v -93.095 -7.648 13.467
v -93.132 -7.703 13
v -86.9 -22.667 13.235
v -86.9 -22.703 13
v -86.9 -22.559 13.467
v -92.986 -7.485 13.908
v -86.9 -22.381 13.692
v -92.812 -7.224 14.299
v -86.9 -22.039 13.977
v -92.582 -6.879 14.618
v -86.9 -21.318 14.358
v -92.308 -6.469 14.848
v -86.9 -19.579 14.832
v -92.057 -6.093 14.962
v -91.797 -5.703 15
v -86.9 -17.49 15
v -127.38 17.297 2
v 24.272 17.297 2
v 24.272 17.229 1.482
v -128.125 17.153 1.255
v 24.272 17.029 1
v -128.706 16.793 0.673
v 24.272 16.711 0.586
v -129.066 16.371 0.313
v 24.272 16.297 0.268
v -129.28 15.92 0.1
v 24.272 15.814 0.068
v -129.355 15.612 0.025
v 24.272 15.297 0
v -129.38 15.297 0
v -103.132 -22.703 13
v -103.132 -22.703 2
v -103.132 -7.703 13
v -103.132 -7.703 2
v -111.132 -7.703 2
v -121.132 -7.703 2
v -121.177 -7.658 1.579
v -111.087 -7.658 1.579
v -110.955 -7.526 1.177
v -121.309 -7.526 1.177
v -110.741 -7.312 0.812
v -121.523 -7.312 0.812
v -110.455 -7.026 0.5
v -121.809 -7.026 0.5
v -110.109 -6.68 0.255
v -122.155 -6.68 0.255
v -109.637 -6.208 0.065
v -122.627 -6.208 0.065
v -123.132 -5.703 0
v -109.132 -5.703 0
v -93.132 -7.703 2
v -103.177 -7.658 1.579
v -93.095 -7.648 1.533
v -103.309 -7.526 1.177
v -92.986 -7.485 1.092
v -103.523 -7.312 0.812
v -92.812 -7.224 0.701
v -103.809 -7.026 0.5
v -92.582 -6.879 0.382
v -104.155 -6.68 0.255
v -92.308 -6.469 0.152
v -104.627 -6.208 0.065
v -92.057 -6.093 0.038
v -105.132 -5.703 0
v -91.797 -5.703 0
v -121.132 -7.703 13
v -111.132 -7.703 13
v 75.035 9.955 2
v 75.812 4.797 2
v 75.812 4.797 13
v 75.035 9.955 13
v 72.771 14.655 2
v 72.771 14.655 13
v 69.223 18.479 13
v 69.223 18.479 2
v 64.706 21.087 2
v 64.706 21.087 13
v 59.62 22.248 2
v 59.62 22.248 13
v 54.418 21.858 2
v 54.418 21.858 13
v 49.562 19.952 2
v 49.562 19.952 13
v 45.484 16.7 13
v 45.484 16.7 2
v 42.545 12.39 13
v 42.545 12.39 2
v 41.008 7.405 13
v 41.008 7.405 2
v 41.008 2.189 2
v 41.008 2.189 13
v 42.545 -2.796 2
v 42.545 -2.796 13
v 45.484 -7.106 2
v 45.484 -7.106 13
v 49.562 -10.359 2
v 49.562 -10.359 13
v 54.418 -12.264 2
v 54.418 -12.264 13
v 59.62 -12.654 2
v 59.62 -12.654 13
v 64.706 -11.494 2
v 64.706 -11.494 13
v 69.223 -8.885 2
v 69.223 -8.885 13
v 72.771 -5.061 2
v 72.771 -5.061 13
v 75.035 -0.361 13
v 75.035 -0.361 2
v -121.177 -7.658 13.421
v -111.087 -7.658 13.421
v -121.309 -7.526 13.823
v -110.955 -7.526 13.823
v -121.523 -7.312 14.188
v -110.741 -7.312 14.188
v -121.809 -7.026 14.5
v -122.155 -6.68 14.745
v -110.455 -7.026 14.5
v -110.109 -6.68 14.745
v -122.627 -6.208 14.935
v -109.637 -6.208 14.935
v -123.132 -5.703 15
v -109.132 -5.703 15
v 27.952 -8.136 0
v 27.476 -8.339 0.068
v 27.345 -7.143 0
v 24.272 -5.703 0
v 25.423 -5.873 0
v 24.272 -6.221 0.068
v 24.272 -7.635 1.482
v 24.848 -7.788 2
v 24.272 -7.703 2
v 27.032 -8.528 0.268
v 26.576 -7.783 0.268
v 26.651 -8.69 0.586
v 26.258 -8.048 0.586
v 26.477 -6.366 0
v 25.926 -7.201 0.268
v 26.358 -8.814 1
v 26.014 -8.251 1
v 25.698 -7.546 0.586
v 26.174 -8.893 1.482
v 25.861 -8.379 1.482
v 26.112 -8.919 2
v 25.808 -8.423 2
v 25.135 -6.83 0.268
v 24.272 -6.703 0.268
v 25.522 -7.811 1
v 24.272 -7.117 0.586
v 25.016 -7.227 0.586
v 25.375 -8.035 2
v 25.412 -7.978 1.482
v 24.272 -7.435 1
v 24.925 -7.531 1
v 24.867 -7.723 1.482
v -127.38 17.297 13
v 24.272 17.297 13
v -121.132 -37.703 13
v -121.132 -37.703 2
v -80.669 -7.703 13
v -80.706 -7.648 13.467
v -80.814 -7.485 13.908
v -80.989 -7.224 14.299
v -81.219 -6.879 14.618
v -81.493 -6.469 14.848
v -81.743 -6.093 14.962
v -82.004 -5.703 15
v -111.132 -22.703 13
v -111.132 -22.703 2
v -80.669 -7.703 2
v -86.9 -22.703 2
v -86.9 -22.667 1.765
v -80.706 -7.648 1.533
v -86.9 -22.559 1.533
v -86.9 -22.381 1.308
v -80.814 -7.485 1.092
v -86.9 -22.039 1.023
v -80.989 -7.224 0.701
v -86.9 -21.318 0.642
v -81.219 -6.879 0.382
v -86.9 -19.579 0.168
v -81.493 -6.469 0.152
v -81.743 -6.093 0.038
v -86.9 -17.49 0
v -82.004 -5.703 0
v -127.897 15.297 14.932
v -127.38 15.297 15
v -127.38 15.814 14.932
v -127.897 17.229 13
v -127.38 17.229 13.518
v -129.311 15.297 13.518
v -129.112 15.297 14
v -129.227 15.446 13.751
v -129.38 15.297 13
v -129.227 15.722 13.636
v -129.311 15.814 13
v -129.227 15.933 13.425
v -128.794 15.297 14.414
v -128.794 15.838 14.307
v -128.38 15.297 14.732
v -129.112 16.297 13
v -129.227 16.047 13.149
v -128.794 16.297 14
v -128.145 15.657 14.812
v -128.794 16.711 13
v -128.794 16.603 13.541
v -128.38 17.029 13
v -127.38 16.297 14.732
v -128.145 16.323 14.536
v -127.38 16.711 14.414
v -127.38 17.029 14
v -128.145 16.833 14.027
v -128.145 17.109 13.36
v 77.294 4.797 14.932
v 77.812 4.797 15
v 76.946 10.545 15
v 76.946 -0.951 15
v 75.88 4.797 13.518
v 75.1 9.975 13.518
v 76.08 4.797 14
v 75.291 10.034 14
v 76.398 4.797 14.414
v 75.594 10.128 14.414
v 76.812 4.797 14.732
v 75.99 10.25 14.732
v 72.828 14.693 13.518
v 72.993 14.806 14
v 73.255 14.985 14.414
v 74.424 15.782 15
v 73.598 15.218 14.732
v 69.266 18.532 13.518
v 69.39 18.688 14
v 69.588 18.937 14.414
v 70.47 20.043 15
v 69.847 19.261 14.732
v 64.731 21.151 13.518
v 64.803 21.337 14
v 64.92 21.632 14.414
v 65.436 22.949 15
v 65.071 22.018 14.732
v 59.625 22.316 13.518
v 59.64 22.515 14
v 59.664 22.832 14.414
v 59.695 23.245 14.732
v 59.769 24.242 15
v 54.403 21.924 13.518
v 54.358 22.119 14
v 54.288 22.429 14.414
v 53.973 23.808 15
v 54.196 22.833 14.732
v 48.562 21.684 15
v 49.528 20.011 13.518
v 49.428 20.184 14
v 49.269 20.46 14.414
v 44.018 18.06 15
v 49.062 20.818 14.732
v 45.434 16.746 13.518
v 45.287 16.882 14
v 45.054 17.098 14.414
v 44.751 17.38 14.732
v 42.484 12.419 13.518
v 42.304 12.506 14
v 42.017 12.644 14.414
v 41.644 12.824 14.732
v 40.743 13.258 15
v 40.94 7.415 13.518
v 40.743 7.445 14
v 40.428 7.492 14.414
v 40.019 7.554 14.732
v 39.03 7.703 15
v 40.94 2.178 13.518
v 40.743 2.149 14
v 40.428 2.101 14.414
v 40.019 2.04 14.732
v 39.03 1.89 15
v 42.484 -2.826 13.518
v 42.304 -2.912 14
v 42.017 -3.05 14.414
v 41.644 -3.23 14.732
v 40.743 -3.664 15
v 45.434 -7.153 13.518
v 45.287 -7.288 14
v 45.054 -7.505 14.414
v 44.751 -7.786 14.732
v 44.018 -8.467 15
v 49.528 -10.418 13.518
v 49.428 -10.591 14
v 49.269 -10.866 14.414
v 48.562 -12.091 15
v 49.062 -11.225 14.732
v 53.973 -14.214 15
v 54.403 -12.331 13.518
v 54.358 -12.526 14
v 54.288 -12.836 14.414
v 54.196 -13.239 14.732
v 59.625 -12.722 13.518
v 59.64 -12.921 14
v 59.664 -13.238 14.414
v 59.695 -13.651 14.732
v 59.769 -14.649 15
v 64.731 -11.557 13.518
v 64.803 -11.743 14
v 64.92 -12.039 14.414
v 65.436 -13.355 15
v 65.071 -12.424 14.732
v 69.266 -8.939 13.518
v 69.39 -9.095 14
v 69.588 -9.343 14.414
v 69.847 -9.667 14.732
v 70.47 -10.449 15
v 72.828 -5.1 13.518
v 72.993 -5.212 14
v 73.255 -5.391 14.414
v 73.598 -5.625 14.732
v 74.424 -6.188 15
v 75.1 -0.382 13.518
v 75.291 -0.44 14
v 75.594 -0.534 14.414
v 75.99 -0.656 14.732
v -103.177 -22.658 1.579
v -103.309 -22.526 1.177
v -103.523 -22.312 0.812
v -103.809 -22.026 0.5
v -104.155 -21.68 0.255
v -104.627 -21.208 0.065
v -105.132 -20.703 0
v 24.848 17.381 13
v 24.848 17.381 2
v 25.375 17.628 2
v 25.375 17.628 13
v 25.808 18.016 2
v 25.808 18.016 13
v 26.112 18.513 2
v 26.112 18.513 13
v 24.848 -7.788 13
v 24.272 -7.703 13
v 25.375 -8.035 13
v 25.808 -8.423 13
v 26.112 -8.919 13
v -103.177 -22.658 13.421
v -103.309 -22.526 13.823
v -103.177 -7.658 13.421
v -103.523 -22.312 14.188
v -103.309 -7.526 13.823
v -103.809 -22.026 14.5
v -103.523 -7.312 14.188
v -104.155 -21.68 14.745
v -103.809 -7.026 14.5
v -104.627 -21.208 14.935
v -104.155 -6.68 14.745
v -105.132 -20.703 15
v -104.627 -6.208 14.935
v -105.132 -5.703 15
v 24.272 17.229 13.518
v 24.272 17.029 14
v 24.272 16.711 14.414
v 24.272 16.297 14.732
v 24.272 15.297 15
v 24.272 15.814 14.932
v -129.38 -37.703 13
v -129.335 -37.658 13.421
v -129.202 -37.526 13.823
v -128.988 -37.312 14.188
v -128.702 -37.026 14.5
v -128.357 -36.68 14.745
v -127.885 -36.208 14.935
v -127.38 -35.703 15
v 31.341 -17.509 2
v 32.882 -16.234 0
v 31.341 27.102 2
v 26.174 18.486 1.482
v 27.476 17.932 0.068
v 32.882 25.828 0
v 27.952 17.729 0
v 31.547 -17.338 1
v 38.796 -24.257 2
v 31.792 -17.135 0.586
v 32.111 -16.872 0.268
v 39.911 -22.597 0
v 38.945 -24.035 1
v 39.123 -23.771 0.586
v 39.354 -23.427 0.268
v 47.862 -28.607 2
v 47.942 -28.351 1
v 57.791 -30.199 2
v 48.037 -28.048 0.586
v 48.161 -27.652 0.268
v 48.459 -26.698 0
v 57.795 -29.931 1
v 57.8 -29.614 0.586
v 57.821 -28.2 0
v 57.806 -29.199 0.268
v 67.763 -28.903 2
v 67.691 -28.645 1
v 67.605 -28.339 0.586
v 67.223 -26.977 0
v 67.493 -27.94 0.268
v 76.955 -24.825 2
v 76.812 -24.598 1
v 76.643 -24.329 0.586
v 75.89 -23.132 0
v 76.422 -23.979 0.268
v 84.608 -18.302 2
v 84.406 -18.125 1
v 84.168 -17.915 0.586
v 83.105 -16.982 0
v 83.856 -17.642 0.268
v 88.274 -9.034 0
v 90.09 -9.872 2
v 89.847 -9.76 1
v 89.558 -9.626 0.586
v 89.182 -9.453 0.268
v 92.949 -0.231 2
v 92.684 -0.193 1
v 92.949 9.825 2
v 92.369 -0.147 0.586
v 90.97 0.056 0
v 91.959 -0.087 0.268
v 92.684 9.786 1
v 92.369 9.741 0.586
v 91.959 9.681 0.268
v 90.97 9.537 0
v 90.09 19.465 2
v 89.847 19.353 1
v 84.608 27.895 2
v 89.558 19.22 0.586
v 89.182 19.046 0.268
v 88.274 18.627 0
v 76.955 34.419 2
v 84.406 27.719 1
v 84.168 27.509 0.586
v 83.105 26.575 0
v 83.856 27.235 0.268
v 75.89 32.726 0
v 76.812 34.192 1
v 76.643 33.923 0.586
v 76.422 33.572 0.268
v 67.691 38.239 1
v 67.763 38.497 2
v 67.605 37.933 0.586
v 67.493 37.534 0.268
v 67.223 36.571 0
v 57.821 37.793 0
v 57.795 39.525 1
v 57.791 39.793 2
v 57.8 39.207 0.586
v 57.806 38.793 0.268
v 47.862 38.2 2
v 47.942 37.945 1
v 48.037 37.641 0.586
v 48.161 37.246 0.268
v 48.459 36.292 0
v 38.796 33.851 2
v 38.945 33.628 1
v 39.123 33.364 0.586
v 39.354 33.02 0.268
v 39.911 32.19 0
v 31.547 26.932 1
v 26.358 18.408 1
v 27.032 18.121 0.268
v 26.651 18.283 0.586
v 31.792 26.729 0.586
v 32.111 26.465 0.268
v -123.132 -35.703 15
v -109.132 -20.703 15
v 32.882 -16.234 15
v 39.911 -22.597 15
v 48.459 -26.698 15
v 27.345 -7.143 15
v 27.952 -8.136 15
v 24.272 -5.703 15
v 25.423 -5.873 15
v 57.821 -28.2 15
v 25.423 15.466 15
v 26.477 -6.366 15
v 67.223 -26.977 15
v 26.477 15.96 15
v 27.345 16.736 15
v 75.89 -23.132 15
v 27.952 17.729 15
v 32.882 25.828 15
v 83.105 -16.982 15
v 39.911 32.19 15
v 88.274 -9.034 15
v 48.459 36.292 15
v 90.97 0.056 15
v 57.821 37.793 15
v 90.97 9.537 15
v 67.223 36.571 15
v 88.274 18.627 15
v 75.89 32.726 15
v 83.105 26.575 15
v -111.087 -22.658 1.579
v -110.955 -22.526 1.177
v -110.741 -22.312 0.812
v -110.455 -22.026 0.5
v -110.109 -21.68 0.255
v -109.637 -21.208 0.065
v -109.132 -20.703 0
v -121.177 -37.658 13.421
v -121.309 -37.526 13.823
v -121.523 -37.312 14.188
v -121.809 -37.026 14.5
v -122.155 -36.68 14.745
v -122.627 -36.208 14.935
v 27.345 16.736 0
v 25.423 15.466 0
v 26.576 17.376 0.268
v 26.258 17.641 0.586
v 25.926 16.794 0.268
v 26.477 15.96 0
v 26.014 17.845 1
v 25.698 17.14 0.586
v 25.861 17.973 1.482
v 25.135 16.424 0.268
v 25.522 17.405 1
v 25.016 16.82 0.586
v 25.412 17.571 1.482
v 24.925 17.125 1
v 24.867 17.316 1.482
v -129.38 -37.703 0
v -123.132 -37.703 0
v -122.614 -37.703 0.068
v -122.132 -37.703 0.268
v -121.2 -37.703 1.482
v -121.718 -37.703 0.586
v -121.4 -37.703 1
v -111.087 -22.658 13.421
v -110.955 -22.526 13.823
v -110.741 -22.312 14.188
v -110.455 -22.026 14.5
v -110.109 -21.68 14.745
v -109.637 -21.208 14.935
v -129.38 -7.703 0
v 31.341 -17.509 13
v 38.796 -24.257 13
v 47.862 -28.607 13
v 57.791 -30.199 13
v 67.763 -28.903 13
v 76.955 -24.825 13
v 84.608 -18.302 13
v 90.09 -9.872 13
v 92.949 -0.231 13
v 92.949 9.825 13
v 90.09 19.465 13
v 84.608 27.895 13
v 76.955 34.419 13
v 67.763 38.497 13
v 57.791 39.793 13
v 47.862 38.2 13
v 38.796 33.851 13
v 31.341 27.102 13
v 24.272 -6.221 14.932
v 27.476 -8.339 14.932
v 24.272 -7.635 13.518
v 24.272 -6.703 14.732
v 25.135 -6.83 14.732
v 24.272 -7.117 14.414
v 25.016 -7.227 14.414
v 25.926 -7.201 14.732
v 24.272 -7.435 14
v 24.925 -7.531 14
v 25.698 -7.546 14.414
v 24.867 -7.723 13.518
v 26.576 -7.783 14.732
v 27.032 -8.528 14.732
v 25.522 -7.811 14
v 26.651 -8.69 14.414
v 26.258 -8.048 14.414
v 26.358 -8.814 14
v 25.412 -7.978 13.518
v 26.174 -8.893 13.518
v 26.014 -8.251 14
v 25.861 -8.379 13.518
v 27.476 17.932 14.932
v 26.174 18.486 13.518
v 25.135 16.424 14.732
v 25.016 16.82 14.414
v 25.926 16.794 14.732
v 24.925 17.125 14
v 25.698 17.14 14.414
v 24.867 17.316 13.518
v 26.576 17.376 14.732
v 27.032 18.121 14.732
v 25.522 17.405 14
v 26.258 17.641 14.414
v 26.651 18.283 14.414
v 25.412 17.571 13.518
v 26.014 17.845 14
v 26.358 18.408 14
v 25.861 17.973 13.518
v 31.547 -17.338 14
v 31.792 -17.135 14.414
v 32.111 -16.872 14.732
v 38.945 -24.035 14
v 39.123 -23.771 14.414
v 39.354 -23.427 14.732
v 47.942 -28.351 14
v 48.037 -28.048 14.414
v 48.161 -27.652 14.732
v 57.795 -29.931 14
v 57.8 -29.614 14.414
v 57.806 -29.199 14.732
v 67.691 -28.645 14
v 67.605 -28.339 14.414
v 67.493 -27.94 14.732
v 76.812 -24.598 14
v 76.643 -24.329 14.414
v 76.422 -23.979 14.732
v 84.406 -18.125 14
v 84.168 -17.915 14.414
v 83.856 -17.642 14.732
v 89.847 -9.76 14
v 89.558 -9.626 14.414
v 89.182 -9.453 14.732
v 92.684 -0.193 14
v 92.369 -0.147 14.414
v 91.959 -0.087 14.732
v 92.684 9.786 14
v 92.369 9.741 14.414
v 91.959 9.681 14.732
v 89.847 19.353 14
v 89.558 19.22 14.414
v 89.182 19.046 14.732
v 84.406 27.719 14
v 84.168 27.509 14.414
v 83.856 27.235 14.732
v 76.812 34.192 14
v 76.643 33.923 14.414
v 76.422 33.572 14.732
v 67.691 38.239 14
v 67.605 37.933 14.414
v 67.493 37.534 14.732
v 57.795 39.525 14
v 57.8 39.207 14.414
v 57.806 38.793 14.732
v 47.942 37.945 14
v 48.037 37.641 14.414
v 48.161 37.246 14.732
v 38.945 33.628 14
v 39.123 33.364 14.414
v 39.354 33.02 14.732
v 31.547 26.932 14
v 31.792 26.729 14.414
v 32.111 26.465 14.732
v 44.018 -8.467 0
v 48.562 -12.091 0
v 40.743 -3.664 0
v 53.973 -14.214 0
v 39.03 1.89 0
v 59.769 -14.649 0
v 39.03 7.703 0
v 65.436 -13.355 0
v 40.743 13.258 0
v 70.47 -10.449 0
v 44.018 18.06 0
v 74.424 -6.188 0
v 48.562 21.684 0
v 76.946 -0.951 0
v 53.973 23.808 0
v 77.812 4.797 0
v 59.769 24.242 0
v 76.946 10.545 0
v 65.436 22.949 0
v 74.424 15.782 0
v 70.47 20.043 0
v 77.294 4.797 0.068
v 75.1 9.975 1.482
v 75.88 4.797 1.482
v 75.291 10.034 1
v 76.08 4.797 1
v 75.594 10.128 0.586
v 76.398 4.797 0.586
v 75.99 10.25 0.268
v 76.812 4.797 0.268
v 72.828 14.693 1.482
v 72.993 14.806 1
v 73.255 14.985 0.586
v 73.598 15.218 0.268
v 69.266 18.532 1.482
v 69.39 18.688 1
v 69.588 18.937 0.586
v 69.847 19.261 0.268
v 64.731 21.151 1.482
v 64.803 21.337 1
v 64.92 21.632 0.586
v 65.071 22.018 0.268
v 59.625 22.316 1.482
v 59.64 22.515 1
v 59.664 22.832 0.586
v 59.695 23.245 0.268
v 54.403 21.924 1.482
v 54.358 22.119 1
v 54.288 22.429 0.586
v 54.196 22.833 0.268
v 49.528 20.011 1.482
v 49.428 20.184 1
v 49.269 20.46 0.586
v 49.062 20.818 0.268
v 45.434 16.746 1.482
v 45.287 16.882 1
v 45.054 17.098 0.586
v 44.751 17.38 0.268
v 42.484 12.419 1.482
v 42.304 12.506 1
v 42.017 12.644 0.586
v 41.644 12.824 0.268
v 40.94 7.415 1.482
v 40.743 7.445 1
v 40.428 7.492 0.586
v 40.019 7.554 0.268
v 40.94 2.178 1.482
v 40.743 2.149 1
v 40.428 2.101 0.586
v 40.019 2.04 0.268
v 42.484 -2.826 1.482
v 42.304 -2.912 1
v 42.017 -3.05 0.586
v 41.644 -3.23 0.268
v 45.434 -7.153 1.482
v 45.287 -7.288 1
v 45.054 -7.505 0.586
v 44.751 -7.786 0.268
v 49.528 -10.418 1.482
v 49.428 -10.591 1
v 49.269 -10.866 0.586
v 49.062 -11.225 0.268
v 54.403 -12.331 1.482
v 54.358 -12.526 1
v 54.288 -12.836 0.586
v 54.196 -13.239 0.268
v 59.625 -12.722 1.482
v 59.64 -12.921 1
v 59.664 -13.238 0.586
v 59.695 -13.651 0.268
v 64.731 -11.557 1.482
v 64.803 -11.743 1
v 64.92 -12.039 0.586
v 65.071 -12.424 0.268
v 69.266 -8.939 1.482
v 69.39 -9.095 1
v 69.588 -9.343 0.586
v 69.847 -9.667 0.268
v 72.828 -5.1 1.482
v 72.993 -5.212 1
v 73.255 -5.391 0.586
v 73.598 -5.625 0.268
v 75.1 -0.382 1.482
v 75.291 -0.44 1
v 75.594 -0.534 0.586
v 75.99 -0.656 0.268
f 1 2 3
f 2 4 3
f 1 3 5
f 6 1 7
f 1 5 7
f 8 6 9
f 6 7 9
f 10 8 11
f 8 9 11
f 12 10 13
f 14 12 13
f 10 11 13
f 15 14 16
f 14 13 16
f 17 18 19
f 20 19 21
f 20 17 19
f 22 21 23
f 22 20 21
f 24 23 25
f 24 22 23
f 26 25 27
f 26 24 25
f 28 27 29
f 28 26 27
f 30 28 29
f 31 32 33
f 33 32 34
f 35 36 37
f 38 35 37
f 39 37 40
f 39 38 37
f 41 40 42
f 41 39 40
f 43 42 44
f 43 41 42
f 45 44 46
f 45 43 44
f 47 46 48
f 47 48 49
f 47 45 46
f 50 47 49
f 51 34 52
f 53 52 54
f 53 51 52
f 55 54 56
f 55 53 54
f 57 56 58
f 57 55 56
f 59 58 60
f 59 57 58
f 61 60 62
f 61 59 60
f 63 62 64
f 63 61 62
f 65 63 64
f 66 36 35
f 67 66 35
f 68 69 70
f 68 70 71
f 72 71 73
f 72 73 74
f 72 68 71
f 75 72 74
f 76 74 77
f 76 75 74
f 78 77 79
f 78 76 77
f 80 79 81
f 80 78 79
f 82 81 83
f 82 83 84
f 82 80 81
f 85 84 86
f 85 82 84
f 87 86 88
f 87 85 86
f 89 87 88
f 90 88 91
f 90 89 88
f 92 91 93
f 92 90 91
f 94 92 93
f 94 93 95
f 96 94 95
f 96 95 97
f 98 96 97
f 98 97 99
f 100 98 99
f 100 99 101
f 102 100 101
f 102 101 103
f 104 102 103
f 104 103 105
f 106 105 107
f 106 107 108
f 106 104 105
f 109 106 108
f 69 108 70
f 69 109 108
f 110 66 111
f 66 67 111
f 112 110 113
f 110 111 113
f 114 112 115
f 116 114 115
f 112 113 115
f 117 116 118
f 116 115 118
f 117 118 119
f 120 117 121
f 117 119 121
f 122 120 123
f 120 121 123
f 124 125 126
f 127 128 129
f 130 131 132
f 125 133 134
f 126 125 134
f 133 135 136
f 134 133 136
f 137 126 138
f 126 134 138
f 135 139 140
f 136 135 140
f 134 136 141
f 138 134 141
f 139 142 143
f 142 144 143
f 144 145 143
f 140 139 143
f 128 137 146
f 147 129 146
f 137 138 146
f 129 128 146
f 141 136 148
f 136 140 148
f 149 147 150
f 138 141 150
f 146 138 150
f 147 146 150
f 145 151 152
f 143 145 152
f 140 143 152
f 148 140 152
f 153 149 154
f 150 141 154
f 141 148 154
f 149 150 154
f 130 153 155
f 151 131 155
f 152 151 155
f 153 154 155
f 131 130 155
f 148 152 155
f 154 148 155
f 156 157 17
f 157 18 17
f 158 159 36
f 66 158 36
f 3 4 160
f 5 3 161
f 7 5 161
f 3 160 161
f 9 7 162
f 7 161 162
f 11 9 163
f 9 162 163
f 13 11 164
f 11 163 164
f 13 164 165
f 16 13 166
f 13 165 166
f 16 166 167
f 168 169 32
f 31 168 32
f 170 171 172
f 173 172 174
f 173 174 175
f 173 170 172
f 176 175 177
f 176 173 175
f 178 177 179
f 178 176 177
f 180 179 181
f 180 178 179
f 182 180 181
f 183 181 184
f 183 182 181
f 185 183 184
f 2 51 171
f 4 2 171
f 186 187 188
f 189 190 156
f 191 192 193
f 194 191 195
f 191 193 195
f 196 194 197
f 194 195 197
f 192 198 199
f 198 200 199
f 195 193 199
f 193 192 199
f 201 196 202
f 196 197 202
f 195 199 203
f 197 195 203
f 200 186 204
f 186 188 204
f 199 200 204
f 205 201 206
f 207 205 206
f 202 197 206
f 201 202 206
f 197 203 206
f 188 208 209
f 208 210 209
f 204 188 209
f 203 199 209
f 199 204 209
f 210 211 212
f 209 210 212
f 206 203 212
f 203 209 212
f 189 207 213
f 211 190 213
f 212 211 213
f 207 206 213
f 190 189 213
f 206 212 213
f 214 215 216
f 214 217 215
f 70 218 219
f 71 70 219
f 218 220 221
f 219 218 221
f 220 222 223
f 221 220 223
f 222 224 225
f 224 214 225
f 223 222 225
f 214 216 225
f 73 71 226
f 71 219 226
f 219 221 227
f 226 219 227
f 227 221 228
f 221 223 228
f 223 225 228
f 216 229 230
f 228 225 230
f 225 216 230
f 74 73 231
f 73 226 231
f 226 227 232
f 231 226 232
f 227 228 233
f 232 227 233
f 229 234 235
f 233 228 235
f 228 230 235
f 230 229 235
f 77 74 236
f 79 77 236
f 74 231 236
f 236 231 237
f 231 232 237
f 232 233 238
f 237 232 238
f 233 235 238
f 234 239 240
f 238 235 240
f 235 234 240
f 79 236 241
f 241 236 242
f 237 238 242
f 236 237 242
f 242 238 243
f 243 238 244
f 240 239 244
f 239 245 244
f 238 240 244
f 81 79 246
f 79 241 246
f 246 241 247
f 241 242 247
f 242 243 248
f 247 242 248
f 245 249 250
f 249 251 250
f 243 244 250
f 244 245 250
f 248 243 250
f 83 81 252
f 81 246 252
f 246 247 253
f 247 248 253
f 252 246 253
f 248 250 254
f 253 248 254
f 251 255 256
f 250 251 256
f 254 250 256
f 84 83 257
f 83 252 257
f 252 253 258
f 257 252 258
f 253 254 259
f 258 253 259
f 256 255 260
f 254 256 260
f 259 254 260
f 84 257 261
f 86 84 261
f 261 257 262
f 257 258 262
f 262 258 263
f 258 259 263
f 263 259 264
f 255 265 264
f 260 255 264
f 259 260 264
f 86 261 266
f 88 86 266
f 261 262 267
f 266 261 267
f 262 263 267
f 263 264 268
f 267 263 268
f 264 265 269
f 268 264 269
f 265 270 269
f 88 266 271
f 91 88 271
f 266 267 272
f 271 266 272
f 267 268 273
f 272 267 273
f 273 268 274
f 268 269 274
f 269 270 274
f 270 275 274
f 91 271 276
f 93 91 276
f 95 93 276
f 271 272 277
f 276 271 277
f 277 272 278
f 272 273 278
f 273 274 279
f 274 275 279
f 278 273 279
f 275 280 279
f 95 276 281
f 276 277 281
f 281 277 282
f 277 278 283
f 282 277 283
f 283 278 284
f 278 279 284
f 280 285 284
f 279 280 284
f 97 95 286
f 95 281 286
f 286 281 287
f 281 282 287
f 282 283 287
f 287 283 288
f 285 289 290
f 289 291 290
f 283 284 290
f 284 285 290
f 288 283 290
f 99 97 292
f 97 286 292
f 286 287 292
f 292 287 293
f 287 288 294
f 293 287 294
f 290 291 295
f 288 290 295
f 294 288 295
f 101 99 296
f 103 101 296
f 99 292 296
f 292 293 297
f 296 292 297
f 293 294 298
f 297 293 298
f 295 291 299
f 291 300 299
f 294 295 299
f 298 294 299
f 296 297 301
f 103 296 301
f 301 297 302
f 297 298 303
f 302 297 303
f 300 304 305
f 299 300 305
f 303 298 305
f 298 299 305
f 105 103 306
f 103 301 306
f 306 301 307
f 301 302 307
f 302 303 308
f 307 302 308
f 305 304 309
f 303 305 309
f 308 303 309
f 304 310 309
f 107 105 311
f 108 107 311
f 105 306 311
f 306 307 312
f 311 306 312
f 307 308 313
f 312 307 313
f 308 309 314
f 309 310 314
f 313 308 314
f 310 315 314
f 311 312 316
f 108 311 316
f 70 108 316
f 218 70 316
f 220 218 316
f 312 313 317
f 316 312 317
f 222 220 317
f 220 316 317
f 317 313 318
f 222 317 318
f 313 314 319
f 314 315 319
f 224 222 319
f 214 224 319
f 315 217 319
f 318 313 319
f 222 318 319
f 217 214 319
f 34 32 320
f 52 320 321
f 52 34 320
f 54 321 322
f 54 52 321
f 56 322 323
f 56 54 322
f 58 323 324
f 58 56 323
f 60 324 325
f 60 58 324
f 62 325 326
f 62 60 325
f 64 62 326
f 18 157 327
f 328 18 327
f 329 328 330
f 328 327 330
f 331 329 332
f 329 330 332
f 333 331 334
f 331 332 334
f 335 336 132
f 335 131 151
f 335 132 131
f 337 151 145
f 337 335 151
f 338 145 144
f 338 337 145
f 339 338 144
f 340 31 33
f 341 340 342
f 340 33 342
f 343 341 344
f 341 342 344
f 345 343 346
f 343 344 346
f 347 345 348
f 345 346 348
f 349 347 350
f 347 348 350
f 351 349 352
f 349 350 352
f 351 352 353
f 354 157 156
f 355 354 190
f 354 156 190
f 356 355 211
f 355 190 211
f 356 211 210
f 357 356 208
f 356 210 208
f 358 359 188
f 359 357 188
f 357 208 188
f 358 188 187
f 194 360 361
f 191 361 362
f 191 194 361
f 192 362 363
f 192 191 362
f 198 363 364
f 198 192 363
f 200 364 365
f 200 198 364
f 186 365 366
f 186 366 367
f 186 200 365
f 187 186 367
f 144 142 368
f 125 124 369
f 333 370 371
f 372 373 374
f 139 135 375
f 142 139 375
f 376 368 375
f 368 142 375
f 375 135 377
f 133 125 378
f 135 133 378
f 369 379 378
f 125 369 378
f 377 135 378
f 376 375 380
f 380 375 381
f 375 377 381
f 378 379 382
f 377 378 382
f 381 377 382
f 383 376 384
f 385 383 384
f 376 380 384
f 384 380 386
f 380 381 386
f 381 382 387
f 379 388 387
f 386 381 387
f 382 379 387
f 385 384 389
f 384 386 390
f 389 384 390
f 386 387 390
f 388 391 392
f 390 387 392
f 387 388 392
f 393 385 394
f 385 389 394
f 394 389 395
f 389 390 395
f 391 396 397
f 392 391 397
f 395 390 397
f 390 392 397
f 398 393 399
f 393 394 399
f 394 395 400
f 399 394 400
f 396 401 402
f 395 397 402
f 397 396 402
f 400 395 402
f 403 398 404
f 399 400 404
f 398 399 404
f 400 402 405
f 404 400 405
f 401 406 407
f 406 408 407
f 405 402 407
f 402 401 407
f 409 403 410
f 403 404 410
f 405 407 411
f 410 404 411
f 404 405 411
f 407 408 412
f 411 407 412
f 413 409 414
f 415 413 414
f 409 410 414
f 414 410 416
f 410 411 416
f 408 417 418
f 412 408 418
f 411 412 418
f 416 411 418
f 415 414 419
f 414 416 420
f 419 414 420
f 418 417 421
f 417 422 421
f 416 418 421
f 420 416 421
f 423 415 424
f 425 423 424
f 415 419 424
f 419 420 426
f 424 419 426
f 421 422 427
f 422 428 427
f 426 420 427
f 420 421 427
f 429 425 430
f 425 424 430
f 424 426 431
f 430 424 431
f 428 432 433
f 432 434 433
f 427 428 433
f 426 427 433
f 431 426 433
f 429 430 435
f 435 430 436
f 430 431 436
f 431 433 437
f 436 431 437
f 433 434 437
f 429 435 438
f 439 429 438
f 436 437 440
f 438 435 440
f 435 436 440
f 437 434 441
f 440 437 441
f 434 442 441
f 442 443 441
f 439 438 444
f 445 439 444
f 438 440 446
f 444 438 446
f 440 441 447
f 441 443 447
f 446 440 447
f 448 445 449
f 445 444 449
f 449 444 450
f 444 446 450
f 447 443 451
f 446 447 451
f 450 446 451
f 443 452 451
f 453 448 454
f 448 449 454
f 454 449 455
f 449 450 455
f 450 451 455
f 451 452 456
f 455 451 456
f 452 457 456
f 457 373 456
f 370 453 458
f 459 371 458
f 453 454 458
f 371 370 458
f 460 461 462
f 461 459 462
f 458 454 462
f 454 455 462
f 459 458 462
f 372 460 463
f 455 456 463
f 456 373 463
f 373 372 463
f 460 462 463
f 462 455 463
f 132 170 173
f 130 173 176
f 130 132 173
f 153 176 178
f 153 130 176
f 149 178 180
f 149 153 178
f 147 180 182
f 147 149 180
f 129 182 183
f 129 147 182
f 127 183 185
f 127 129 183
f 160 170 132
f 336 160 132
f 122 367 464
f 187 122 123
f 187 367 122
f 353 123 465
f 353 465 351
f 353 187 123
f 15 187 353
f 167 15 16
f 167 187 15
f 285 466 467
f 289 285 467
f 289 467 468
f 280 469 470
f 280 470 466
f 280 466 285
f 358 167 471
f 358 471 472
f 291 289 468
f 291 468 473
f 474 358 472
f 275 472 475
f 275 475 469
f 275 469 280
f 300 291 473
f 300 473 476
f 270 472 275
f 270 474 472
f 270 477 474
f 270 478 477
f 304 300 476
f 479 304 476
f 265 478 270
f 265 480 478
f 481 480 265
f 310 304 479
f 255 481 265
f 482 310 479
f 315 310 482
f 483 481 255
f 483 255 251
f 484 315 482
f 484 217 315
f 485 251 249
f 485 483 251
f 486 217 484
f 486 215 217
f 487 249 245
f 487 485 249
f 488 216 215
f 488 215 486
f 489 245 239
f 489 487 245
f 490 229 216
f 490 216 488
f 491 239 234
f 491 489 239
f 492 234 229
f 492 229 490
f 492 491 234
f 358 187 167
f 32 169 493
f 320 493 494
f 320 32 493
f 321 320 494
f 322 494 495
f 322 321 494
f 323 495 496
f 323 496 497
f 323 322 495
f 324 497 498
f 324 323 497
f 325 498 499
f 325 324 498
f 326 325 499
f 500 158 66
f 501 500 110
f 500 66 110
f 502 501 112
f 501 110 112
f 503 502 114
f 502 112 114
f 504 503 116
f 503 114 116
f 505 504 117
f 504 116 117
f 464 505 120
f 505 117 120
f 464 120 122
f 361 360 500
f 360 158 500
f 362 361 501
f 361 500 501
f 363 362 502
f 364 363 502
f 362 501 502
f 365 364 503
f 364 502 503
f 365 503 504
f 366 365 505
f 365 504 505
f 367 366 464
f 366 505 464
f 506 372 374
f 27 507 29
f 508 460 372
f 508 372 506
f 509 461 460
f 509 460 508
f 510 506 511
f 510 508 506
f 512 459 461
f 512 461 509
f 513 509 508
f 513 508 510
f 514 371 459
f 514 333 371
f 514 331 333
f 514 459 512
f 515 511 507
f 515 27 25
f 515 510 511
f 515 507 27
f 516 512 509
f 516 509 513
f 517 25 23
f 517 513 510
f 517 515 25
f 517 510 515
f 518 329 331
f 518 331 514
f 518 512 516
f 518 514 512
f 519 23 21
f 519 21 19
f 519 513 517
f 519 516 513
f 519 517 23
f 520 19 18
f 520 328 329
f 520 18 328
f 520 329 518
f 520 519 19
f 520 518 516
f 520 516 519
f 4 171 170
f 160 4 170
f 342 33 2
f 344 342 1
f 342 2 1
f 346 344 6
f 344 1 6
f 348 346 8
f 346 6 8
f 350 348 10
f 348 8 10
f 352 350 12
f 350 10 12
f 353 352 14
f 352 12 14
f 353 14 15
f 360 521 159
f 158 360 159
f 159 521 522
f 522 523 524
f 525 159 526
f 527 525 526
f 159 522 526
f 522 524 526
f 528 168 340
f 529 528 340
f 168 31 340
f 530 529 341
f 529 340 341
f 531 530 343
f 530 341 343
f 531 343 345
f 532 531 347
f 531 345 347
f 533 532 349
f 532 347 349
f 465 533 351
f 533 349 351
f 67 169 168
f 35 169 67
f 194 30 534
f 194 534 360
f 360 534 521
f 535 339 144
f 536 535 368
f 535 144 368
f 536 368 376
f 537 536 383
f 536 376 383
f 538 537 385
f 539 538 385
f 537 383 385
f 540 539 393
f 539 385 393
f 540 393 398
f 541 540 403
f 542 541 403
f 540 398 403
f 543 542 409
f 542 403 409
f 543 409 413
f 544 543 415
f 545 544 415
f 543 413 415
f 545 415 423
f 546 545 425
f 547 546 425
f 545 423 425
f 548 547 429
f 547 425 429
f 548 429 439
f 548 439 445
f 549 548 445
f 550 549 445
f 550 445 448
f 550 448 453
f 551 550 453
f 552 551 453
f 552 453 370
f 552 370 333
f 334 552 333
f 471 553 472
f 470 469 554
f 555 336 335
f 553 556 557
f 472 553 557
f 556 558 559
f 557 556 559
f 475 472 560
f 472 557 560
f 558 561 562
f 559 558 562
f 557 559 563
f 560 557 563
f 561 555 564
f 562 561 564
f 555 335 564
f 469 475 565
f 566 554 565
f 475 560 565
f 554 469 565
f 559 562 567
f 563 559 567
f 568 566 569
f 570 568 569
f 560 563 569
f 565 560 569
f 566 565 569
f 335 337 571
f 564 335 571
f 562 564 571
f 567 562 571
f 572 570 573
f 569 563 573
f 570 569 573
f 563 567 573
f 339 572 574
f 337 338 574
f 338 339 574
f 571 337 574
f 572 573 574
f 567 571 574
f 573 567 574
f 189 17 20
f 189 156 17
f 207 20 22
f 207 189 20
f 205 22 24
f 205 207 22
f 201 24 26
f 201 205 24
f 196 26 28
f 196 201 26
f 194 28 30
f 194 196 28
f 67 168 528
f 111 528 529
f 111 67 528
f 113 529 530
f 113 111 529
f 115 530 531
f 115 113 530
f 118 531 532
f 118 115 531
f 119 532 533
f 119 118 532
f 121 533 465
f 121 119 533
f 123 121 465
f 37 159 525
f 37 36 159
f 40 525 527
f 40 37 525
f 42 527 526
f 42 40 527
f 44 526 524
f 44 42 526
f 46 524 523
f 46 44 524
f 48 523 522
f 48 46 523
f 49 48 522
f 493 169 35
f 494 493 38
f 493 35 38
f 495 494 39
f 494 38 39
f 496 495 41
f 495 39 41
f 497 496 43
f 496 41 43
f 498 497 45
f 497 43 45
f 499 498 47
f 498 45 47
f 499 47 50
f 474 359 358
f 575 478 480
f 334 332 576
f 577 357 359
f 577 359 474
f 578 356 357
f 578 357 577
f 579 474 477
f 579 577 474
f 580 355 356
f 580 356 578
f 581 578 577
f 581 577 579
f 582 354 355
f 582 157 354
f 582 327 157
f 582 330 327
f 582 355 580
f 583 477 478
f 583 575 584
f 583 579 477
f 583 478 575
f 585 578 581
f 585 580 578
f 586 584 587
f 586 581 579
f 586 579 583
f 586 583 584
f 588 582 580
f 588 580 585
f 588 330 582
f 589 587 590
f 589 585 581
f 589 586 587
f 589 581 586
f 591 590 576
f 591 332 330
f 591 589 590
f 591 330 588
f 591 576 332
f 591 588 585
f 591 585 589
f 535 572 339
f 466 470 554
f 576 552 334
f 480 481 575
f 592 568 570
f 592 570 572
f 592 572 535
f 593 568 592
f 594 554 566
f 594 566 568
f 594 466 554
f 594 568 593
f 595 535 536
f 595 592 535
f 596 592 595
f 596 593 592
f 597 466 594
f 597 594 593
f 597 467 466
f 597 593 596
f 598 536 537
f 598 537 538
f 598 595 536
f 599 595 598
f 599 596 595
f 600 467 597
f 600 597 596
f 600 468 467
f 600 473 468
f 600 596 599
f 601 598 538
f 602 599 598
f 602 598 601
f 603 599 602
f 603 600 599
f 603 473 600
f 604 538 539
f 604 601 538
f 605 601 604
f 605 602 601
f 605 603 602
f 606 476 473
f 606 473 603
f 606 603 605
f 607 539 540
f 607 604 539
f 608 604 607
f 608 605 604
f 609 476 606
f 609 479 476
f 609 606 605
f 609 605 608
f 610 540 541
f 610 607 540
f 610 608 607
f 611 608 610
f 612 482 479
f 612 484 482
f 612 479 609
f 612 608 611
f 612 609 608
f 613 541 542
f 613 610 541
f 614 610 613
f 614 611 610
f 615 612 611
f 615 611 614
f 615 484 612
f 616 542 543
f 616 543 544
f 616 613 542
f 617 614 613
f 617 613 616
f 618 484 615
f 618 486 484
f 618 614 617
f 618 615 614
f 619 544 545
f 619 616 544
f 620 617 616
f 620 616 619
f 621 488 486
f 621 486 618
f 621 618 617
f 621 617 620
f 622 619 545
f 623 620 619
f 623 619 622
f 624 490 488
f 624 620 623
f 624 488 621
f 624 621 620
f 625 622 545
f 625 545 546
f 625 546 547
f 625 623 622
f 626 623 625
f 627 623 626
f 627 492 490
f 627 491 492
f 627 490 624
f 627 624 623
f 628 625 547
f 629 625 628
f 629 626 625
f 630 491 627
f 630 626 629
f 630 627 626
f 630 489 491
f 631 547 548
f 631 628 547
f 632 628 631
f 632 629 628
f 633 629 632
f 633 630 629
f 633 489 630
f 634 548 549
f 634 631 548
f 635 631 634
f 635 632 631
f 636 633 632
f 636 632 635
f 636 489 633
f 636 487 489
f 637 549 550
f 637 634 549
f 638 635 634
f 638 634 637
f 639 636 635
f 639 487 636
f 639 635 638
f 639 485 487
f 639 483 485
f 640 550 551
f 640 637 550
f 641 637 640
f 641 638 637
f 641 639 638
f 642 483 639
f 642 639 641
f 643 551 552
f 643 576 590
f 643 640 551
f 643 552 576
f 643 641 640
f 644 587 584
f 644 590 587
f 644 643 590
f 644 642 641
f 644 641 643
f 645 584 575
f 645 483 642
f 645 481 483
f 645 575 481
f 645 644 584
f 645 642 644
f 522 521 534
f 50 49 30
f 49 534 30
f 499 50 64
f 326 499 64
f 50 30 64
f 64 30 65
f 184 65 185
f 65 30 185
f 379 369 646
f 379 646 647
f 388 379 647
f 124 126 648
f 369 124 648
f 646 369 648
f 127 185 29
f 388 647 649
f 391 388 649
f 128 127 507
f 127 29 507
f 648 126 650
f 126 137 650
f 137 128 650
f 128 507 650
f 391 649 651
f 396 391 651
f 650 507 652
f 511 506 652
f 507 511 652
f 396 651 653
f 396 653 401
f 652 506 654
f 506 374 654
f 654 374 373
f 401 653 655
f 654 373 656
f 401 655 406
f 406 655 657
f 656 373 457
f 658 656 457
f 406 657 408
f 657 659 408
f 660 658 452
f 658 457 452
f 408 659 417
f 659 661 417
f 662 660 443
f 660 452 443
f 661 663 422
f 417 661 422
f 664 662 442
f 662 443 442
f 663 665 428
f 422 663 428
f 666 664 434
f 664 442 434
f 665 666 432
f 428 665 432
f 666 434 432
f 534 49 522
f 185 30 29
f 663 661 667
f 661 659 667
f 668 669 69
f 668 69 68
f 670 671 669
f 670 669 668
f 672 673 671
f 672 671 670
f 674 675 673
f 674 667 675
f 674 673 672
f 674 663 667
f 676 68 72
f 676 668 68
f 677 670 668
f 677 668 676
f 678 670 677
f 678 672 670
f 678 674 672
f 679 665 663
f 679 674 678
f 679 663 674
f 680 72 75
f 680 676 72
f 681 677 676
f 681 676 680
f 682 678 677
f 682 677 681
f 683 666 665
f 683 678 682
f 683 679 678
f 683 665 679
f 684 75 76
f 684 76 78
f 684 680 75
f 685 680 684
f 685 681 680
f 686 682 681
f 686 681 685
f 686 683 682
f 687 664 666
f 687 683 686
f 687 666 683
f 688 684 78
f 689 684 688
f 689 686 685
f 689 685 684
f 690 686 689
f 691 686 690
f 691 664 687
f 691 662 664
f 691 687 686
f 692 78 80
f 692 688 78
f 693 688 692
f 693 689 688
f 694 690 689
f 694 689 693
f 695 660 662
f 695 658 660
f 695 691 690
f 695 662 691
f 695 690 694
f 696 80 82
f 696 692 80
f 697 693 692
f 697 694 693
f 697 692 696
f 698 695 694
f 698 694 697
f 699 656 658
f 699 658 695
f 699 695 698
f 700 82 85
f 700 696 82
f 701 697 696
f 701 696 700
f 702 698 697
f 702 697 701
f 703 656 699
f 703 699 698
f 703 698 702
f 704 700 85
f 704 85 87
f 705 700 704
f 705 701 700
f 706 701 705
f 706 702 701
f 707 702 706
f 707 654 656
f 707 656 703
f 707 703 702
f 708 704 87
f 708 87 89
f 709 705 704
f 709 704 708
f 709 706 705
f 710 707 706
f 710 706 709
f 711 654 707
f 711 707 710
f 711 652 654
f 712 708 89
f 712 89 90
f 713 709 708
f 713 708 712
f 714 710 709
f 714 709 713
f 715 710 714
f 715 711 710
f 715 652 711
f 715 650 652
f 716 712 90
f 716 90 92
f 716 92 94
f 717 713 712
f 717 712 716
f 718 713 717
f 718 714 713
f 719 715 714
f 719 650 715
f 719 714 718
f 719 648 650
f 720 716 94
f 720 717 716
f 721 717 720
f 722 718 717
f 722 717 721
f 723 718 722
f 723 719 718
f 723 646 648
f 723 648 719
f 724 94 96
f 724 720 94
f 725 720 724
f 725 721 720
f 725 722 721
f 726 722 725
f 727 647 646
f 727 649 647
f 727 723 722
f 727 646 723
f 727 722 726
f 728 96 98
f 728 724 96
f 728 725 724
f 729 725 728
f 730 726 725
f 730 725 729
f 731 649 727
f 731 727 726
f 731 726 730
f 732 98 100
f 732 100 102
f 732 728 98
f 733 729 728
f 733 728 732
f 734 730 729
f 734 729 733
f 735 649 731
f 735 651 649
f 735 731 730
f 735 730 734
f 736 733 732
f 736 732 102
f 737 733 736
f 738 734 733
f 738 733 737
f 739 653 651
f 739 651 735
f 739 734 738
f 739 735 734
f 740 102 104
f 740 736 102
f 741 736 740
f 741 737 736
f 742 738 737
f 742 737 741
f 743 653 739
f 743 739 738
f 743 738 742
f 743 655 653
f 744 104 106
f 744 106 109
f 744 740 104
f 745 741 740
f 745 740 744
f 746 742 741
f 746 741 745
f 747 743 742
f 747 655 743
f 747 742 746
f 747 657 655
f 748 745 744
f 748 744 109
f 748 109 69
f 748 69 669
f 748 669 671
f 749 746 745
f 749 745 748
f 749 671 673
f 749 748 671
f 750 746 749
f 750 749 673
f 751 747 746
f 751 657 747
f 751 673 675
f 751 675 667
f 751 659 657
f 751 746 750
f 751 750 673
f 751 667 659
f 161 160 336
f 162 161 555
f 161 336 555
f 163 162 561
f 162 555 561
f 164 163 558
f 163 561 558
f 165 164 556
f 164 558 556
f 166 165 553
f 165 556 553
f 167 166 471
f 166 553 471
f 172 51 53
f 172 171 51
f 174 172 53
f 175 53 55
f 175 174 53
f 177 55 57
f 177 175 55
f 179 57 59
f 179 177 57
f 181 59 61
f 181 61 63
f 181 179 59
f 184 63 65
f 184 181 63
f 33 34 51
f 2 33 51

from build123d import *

# Parameters (mm, degrees)
F0_R     = 17.5
F0_W     = 8.2477046886
F0_H     = 30
F0_W_2   = 8
F0_H_2   = 15
F1_DEPTH = 15
F2_R     = 2


with BuildPart() as f1:
    # F0 (on Top) → F1 (new body)
    with BuildSketch(Plane.XY):
        Polygon((25.6203956529, 17.2967884245), (-129.3796043471, 17.2967884245), (-129.3796043471, -7.7032115755), (-121.1318996584, -7.7032115755), (-111.1318996584, -7.7032115755), (-103.1318996584, -7.7032115755), (-93.1318996584, -7.7032115755), (-80.6687141383, -7.7032115755), (25.6203956529, -7.7032115755), align=None)
        with BuildLine():
            ThreePointArc((25.6203956529, -7.7032115755), (93.3121377295, 4.7967884245), (25.6203956529, 17.2967884245))
            Line((25.6203956529, 17.2967884245), (25.6203956529, -7.7032115755))
        make_face()
        with Locations((58.3121377295, 4.7967884245)):
            Circle(F0_R, mode=Mode.SUBTRACT)
        with Locations((-125.2557520027, -22.7032115755)):
            Rectangle(F0_W, F0_H)
        with Locations((-107.1318996584, -15.2032115755)):
            Rectangle(F0_W_2, F0_H_2)
        Polygon((-86.9003068984, -22.7032115755), (-80.6687141383, -7.7032115755), (-93.1318996584, -7.7032115755), align=None)
    extrude(amount=F1_DEPTH)

    # F2
    f2_edges = [f1.edges().sort_by_distance(p)[0] for p in [
        (-51.879604, 17.296788, 15),
        (-27.524159, -7.703212, 15),
        (-83.784511, -15.203212, 15),
        (-103.1319, -15.203212, 15),
        (-98.1319, -7.703212, 15),
        (-90.016103, -15.203212, 15),
        (-111.1319, -15.203212, 15),
        (-107.1319, -22.703212, 15),
        (-116.1319, -7.703212, 15),
        (-121.1319, -22.703212, 15),
        (-125.255752, -37.703212, 15),
        (-129.379604, -10.203212, 15),
        (93.312138, 4.796788, 15),
        (40.812138, 4.796788, 15),
        (25.620396, -7.703212, 7.5),
        (25.620396, 17.296788, 7.5),
        (93.312138, 4.796788, 0),
        (-129.379604, 17.296788, 7.5),
        (-51.879604, 17.296788, 0),
        (-116.1319, -7.703212, 0),
        (-111.1319, -15.203212, 0),
        (-121.1319, -22.703212, 0),
        (-103.1319, -15.203212, 0),
        (-98.1319, -7.703212, 0),
        (-90.016103, -15.203212, 0),
        (-27.524159, -7.703212, 0),
        (-107.1319, -22.703212, 0),
        (-83.784511, -15.203212, 0),
        (40.812138, 4.796788, 0),
    ]]
    fillet(f2_edges, radius=F2_R)


solid = f1.part
